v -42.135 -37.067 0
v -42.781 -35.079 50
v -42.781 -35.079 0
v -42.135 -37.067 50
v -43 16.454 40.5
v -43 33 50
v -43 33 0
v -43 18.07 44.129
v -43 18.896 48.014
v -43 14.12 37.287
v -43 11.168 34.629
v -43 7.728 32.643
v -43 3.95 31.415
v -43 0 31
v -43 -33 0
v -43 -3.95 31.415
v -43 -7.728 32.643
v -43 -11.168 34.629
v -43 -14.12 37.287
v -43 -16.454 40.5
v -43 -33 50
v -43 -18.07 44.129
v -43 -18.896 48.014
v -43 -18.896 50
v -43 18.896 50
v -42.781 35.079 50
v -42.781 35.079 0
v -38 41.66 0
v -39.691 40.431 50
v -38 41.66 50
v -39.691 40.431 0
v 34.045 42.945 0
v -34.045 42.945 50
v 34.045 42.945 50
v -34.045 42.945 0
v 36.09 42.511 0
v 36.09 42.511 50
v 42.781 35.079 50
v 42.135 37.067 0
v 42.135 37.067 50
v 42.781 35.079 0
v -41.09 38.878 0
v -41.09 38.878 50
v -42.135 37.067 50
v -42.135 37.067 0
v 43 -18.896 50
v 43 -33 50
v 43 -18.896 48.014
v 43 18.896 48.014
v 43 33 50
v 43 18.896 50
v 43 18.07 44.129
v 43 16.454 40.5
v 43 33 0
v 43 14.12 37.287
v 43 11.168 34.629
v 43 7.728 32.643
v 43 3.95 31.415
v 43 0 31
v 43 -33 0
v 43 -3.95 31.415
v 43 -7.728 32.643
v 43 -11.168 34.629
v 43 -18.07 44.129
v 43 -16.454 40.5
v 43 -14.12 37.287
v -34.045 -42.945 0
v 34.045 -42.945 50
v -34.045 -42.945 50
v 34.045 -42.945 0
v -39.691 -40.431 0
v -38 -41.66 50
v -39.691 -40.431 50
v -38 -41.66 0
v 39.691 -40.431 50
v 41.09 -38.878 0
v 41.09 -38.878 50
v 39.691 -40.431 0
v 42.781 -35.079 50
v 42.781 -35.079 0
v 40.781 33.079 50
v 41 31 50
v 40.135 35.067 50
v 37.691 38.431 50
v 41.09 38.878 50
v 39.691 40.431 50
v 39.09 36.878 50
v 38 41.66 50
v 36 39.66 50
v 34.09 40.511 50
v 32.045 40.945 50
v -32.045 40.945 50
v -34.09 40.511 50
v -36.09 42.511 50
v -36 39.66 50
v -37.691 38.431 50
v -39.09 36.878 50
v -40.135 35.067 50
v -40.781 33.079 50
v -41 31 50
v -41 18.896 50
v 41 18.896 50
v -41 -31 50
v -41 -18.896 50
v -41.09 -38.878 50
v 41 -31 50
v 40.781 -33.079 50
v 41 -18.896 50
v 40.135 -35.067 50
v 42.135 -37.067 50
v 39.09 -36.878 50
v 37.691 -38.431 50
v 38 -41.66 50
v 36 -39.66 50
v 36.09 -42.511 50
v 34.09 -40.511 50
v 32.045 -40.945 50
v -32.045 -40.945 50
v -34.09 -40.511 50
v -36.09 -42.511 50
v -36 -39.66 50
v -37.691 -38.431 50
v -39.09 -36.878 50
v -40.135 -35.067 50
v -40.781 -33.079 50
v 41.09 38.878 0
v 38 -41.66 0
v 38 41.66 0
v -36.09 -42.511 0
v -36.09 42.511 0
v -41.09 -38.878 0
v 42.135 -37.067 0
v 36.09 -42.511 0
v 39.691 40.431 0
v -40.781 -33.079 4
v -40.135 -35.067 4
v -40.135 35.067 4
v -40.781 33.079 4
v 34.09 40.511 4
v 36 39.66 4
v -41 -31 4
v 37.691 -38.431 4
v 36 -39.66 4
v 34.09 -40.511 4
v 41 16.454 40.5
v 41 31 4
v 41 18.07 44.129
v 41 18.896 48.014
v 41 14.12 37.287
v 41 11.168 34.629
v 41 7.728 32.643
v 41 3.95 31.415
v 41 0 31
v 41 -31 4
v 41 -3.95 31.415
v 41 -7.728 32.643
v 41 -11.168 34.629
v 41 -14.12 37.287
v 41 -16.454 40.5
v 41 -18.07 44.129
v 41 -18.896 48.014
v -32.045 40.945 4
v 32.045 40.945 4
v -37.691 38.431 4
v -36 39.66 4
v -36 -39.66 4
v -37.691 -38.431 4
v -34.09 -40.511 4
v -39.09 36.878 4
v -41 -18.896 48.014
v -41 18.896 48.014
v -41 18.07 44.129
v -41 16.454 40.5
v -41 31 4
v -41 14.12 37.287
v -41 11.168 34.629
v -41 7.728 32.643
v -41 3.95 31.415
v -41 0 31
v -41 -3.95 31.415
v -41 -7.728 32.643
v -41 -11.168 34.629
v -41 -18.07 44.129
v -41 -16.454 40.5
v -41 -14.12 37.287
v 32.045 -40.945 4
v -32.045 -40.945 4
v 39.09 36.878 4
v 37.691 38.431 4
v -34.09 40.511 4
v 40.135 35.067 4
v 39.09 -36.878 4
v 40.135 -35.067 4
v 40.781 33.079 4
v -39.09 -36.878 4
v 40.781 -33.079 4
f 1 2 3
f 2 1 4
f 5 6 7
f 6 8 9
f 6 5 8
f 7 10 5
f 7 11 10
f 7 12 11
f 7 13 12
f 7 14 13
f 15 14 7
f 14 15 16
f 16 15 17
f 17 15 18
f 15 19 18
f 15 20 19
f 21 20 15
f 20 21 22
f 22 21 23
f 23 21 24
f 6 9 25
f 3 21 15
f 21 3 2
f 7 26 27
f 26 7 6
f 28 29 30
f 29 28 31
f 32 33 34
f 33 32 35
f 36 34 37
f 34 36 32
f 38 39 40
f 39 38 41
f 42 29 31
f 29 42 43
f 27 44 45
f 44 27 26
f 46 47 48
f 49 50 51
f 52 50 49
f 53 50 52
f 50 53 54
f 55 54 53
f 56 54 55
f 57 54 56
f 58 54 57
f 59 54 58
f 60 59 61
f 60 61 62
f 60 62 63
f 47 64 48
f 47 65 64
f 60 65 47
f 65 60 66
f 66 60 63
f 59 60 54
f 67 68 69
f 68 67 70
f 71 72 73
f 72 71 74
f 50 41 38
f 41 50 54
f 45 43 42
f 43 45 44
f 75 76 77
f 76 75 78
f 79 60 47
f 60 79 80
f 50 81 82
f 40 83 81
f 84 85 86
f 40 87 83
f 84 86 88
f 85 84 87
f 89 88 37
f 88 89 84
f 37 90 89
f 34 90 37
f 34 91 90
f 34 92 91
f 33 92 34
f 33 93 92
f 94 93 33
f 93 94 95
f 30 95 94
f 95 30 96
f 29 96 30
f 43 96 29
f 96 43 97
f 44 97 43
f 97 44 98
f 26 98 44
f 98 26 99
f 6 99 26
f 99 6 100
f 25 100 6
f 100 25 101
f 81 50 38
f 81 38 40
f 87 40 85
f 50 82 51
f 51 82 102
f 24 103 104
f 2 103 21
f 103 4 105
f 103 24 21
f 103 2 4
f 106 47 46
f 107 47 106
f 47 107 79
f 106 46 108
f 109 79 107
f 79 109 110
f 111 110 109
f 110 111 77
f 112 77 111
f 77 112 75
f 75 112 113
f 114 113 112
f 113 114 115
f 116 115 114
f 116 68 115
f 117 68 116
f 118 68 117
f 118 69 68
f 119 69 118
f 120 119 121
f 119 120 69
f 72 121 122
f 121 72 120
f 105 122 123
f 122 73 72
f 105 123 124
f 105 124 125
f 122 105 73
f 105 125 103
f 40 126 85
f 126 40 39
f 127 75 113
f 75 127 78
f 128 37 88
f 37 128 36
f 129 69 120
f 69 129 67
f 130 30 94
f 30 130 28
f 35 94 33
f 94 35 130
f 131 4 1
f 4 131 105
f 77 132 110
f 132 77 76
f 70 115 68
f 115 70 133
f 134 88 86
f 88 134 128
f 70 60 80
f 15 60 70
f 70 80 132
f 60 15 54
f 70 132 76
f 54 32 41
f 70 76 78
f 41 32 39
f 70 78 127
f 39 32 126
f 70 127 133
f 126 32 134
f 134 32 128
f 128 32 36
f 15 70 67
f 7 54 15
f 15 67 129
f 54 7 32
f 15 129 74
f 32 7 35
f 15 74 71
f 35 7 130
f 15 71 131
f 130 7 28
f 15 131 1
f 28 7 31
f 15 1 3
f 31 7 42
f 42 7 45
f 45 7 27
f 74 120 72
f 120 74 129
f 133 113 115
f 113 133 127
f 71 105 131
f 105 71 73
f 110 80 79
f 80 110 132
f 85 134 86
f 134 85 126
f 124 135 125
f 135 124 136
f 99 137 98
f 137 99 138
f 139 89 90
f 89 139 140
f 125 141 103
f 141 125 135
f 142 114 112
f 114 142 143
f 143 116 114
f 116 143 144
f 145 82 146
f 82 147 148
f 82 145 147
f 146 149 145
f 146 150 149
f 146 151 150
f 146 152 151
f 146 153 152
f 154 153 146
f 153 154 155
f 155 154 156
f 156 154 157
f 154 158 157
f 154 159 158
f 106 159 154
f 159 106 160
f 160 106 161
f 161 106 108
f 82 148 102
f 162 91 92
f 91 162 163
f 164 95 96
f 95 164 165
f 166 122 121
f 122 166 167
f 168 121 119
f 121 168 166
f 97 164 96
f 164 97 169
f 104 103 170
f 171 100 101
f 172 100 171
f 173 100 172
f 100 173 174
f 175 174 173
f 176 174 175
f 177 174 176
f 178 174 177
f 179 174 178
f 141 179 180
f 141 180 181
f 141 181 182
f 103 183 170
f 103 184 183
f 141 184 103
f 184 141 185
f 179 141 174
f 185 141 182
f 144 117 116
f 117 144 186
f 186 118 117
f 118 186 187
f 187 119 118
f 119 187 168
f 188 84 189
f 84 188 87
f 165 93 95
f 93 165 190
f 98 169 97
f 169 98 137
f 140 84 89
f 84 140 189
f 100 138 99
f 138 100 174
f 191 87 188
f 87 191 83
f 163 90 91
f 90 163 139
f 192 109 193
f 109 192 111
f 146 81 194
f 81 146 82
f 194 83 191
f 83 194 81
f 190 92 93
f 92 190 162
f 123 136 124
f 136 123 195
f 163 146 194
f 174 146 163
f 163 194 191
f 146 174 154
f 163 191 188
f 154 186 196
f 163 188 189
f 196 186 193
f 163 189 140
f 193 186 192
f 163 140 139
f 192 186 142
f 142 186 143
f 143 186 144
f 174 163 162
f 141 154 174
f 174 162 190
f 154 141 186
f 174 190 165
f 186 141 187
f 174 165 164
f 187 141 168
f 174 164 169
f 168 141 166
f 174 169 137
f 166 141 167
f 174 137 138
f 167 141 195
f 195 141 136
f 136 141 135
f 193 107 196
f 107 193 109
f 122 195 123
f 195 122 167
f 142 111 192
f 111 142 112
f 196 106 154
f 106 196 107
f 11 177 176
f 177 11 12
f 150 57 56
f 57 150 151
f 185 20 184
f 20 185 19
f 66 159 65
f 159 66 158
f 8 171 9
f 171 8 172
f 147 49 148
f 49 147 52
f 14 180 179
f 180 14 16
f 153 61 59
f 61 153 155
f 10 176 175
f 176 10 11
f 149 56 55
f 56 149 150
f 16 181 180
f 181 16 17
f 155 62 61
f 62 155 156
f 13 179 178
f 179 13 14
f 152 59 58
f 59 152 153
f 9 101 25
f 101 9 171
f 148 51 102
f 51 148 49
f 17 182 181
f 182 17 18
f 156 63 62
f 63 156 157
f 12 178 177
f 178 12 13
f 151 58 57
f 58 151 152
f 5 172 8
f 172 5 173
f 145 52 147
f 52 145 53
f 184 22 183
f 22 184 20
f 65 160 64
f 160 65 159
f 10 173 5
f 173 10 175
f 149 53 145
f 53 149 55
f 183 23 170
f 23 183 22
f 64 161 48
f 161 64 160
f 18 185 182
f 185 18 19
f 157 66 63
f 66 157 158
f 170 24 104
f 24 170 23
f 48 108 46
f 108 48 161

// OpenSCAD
module roundedRect(size, radius, fn = 30)
{
    x = size[0] / 2;
    y = size[1] / 2;
    z = size[2];

    linear_extrude(height=z)
    hull()
    {
        translate([-x+radius, -y+radius, 0])
        circle(r=radius, $fn = fn);

        translate([x-radius, -y+radius, 0])
        circle(r=radius, $fn = fn);

        translate([-x+radius, y-radius, 0])
        circle(r=radius, $fn = fn);

        translate([x-radius, y-radius, 0])
        circle(r=radius, $fn = fn);
    }
}


$wallThickness = 4;
$padding = 2;
$width = 80;
$height = 50;
$innerWidth = $width + $padding;
$outerWidth = $innerWidth + $wallThickness;

union(){
    difference(){
        union(){
            difference(){
                roundedRect([$outerWidth,$outerWidth,$height],10);
                translate([0,0,$wallThickness]){
                    roundedRect([$innerWidth,$innerWidth,$height],10);
                }
            }
        }

        rotate([0,90,0]){
            translate([-$height,0,-($outerWidth/2) - $wallThickness]){
                cylinder($fn = 30, h=$outerWidth+ ($wallThickness * 2), r=19);
            }
        }
    }
    
}
